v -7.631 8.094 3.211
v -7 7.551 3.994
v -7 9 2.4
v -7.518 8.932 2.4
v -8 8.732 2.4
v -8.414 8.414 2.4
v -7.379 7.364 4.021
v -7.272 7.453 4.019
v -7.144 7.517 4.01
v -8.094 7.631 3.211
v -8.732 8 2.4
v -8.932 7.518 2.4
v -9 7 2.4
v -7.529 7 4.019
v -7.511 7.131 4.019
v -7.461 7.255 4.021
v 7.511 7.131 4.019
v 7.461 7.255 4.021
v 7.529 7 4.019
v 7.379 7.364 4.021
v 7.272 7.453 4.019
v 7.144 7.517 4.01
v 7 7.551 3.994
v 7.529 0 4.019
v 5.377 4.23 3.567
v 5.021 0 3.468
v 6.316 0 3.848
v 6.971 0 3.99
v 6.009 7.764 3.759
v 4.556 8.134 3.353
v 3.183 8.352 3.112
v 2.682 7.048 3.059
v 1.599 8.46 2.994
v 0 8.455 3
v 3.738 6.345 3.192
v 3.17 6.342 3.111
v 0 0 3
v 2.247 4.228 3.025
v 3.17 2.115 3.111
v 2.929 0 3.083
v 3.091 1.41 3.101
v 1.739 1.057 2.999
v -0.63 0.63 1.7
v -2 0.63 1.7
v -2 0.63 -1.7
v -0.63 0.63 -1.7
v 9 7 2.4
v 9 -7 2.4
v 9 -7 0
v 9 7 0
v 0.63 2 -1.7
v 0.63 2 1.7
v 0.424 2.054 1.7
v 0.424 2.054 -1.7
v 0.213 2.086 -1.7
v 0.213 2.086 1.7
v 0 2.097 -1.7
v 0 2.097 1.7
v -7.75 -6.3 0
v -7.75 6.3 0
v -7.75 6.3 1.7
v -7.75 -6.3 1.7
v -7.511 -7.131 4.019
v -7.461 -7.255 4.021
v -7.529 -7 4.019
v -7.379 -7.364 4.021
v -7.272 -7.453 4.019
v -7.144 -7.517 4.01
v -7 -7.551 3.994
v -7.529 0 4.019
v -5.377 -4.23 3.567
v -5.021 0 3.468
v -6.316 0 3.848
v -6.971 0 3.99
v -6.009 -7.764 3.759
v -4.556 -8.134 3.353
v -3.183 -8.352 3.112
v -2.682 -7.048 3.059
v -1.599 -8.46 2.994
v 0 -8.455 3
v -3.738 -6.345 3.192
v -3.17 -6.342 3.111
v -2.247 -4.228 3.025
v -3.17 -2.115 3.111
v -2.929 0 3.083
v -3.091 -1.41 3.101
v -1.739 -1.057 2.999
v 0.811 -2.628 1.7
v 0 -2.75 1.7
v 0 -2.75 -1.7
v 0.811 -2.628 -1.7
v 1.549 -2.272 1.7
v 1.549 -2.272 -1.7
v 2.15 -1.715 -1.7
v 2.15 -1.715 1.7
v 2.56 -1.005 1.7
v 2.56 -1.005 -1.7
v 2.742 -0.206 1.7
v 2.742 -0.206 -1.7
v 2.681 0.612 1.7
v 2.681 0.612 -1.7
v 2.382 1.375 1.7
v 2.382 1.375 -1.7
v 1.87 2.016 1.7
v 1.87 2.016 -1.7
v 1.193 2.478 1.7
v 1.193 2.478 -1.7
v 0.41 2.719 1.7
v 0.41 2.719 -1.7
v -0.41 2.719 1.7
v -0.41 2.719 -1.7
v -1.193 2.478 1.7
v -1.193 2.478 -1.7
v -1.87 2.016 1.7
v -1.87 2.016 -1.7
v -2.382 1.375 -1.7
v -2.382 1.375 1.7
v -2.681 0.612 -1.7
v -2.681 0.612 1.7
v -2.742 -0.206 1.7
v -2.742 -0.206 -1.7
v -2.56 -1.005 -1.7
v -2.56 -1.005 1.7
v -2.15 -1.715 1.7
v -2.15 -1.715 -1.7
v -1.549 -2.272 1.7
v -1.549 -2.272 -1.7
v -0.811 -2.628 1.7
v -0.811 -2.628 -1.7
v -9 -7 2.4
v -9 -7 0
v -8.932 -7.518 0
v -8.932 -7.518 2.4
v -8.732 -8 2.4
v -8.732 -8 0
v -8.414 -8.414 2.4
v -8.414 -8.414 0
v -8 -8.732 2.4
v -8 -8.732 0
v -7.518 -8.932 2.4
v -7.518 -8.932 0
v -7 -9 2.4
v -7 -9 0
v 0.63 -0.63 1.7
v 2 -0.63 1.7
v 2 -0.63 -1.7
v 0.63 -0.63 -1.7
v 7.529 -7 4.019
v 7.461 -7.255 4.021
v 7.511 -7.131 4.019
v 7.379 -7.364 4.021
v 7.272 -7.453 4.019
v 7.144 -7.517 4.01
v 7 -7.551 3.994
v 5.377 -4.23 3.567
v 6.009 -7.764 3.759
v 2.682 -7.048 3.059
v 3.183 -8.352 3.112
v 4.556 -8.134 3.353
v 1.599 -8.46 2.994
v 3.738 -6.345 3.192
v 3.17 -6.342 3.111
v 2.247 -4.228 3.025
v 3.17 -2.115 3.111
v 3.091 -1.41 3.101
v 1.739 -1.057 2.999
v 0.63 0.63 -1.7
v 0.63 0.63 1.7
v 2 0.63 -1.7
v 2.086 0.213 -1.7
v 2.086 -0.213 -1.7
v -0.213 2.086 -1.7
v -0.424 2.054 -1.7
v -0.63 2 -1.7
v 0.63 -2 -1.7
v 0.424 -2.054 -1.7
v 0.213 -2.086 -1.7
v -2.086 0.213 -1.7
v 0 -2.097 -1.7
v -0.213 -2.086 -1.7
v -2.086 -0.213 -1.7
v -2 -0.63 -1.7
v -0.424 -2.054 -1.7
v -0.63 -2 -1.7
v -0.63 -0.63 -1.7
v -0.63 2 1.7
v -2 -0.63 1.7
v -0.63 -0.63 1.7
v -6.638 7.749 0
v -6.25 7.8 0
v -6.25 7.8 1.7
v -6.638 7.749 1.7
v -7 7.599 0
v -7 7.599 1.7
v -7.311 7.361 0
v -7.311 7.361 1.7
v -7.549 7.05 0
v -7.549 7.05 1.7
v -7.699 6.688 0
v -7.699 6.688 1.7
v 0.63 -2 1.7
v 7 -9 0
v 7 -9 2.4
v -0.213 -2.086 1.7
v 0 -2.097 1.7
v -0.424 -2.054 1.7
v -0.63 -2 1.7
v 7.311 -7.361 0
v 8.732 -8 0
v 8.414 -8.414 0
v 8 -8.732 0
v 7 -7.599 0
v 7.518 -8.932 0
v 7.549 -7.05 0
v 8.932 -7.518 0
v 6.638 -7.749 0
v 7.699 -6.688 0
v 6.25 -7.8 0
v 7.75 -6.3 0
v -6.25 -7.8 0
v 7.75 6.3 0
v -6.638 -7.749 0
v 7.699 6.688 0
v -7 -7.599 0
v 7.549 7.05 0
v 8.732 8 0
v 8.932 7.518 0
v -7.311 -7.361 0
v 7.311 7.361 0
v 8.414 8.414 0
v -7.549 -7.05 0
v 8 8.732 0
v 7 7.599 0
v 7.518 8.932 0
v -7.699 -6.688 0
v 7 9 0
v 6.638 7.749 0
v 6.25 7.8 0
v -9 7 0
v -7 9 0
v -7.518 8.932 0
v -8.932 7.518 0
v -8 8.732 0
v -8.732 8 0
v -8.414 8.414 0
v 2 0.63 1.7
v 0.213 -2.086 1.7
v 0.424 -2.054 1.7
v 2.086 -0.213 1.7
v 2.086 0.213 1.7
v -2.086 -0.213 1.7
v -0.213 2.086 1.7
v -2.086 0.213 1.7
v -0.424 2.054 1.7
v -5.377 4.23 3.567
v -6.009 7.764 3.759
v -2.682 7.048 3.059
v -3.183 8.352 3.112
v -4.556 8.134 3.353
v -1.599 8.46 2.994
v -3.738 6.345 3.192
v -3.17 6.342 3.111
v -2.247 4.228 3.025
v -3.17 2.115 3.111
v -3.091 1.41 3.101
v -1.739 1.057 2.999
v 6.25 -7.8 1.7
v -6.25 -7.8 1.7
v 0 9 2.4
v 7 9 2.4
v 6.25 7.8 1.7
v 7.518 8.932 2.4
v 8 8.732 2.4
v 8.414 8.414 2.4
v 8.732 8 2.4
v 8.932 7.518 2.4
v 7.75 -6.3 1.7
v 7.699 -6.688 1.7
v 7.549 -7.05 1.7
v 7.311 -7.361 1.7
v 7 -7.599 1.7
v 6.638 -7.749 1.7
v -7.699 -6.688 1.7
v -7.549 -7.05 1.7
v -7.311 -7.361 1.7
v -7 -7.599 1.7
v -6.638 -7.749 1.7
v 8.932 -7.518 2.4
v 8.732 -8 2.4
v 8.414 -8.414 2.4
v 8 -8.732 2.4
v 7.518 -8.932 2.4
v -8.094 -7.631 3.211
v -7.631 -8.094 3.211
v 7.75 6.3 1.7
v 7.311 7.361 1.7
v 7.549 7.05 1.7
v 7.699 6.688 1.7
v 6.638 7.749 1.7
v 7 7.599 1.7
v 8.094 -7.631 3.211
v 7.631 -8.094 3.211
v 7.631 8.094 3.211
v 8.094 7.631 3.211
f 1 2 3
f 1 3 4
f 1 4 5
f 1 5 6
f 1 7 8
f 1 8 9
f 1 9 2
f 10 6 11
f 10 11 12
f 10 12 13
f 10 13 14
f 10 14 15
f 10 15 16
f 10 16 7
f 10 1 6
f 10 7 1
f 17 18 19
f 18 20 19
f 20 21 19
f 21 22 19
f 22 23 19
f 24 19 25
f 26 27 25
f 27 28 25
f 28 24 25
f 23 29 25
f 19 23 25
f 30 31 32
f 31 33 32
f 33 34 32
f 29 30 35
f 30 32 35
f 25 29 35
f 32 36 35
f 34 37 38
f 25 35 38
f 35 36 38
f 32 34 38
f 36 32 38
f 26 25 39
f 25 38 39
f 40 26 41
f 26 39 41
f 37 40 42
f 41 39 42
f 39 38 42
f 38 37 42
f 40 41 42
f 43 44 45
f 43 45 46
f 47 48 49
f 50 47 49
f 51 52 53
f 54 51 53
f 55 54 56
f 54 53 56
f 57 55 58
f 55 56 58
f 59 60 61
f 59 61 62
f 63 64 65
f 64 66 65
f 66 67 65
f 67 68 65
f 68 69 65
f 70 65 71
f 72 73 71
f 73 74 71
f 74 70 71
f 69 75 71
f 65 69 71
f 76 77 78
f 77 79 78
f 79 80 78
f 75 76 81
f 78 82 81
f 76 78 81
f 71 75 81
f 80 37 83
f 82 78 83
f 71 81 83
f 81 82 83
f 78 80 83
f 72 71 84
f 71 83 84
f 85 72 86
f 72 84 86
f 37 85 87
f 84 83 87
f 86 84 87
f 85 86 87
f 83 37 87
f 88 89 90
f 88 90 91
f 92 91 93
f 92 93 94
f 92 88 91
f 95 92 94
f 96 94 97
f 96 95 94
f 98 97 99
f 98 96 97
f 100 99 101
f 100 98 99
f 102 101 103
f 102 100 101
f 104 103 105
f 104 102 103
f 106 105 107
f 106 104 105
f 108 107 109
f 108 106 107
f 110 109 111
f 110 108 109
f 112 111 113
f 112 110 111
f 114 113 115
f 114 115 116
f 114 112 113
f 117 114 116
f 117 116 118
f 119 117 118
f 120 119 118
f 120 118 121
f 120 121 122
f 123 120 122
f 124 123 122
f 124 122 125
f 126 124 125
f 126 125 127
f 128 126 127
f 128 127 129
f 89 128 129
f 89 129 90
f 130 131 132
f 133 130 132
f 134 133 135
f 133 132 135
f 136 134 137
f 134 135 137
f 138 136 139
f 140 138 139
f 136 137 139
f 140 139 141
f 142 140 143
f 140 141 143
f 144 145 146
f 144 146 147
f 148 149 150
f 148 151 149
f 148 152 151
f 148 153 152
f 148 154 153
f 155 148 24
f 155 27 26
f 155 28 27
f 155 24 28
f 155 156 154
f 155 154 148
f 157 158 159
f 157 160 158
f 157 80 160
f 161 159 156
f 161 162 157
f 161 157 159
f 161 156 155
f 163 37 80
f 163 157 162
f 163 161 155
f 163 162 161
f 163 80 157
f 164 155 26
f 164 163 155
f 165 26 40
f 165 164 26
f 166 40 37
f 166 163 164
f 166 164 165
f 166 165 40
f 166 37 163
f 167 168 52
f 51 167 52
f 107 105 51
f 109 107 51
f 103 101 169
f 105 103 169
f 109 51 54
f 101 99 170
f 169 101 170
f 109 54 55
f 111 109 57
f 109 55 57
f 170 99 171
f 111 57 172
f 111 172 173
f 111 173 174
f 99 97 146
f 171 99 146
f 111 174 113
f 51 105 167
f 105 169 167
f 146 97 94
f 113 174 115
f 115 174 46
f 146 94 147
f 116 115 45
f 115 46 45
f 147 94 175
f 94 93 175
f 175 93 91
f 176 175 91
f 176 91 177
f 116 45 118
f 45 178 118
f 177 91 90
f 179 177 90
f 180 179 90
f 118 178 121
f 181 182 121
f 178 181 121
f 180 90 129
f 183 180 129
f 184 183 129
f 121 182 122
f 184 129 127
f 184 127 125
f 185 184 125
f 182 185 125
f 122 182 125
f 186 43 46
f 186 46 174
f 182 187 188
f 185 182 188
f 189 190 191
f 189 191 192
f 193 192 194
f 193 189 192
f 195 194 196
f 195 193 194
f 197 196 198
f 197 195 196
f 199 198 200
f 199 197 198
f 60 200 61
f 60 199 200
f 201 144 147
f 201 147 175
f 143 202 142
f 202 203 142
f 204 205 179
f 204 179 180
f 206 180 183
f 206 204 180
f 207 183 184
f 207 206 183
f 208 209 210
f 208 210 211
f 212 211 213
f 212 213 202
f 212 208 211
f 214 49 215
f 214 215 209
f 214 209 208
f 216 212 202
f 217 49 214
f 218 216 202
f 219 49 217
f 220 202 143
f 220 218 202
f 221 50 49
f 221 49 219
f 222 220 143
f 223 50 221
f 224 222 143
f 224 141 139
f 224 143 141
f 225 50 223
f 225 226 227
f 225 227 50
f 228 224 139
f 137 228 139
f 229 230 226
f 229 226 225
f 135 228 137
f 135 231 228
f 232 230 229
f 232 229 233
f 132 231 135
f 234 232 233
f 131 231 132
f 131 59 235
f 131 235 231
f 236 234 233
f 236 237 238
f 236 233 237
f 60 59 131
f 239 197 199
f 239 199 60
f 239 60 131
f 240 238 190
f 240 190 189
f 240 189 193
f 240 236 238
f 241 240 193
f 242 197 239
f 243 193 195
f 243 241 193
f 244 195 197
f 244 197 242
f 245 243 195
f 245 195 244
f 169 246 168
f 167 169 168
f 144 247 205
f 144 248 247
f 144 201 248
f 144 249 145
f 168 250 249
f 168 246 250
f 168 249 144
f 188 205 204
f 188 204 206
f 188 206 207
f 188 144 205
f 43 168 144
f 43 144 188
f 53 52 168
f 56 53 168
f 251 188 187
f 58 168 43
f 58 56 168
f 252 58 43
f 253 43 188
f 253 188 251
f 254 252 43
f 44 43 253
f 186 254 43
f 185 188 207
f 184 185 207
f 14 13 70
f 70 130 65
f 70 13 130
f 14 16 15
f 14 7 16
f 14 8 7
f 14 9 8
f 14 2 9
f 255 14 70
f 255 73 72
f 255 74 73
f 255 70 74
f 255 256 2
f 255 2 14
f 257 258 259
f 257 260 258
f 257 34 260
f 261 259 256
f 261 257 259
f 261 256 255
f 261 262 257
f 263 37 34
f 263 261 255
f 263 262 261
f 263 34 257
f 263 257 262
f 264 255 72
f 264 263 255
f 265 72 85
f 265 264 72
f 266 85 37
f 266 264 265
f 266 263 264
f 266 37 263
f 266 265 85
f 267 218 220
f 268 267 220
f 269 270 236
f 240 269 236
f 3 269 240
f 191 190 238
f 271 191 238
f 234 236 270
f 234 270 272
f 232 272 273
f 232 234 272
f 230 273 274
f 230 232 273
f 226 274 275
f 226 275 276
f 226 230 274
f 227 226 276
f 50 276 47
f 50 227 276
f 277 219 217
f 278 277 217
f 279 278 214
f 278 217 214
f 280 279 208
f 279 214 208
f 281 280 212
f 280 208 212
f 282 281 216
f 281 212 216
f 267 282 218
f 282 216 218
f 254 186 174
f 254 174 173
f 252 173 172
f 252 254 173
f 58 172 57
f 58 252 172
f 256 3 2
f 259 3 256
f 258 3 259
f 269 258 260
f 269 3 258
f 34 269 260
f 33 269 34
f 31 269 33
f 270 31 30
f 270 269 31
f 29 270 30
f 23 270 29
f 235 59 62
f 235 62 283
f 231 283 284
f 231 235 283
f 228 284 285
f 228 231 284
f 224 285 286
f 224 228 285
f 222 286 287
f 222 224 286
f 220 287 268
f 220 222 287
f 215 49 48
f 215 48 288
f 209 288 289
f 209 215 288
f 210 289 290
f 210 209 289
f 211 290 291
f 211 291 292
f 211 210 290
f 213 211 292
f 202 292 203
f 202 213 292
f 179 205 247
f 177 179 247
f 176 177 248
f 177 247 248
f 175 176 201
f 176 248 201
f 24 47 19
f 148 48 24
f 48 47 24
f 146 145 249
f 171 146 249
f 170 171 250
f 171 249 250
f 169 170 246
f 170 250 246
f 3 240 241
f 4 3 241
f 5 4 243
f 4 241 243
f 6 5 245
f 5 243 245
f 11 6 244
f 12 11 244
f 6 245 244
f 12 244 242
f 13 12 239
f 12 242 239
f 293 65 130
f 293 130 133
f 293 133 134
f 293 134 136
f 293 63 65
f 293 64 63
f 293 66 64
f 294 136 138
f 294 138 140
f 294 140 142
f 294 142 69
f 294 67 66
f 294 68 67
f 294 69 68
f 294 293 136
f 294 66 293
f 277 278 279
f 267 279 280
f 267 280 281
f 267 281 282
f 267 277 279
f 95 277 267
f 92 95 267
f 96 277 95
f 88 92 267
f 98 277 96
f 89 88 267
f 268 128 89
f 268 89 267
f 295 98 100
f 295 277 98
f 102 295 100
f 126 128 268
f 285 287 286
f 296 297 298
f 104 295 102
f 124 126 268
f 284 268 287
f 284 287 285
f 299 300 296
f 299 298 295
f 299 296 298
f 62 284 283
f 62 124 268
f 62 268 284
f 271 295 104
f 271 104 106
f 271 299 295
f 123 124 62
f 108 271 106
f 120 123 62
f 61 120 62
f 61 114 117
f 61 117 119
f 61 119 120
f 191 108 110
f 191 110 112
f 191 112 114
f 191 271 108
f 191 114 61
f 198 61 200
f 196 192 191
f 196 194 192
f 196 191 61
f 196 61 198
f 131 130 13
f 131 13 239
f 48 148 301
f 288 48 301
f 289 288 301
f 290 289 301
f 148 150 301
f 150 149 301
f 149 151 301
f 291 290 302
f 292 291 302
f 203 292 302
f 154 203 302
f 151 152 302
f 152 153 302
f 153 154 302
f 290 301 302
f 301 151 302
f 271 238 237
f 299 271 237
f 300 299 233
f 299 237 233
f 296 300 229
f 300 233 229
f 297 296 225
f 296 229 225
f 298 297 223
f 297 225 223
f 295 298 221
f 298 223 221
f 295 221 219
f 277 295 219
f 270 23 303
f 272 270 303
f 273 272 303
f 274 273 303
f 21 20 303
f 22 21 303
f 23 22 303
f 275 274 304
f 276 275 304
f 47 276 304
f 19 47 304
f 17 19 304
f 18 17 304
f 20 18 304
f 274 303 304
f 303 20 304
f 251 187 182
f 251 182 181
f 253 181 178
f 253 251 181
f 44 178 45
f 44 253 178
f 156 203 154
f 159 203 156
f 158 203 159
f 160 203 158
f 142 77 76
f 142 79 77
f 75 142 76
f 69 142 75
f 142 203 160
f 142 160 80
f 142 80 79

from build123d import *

# Parameters (mm, degrees)
SKETCH_W        = 9
SKETCH_H        = 18
PAD_DEPTH       = 2.7
PAD001_DEPTH    = 9
POCKET_DEPTH    = 10
POCKET001_DEPTH = 1.7
PAD002_DEPTH    = 3.4


with BuildPart() as part:
    # Sketch → Pad (new body)
    with BuildSketch(Plane.XY):
        with Locations((-4.5, 0)):
            Rectangle(SKETCH_W, SKETCH_H)
    extrude(amount=PAD_DEPTH)

    # Sketch001 → Pad001 (join, symmetric)
    with BuildSketch(Plane.XZ):
        with BuildLine():
            Line((-9, 2.7), (0, 2.7))
            Line((0, 2.7), (0, 3))
            add(Edge.make_bspline(
                [(0, 3), (-2.554918, 2.91153), (-5.658926, 3.478662), (-7.63445, 4.400123), (-9, 3.5)],
                knots=[0, 0, 0, 0, 0.5, 1, 1, 1, 1], degree=3))
            Line((-9, 3.5), (-9, 2.7))
        make_face()
    extrude(amount=PAD001_DEPTH, both=True)

    # Sketch002 → Pocket (cut)
    with BuildSketch(Plane.XY):
        with BuildLine():
            ThreePointArc((-7, 9), (-8.414214, 8.414214), (-9, 7))
            Line((-9, 7), (-10, 7))
            Line((-10, 7), (-10, 10))
            Line((-10, 10), (-7, 10))
            Line((-7, 10), (-7, 9))
        make_face()
        with BuildLine():
            ThreePointArc((-9, -7), (-8.414214, -8.414214), (-7, -9))
            Line((-7, -9), (-7, -10))
            Line((-10, -10), (-7, -10))
            Line((-10, -7), (-10, -10))
            Line((-9, -7), (-10, -7))
        make_face()
    extrude(amount=POCKET_DEPTH, mode=Mode.SUBTRACT)

    # Sketch003 → Pocket001 (cut)
    with BuildSketch(Plane.XY):
        with BuildLine():
            Line((0, 7.8), (-6.25, 7.8))
            ThreePointArc((-6.25, 7.8), (-7.31066, 7.36066), (-7.75, 6.3))
            Line((-7.75, 6.3), (-7.75, -6.3))
            ThreePointArc((-7.75, -6.3), (-7.31066, -7.36066), (-6.25, -7.8))
            Line((-6.25, -7.8), (0, -7.8))
            Line((0, -7.8), (0, 0))
            Line((0, 0), (0, 7.8))
        make_face()
    extrude(amount=POCKET001_DEPTH, mode=Mode.SUBTRACT)

    # Sketch004 (on Face10 of Pocket001) → Pad002 (join)
    with BuildSketch(Plane(origin=(0, 0, 1.7), x_dir=(1, 0, 0), z_dir=(0, 0, -1))):
        with BuildLine():
            ThreePointArc((0, 2.75), (-2.75, 0), (0, -2.75))
            Line((0, -2.096879), (0, -2.75))
            ThreePointArc((-0.63, -2), (-0.318703, -2.072517), (0, -2.096879))
            Line((-0.63, -0.63), (-0.63, -2))
            Line((-2, -0.63), (-0.63, -0.63))
            ThreePointArc((-2, 0.63), (-2.096879, 0), (-2, -0.63))
            Line((-2, 0.63), (-0.63, 0.63))
            Line((-0.63, 0.63), (-0.63, 2))
            ThreePointArc((0, 2.096879), (-0.318703, 2.072517), (-0.63, 2))
            Line((0, 2.75), (0, 2.096879))
        make_face()
    extrude(amount=PAD002_DEPTH)

    # SubtractivePipe: sweep along a path in Sketch009
    with BuildLine(Plane(origin=(0, 0, 2.4), x_dir=(0, -1, 0), z_dir=(0, 0, 1))) as subtractivepipe_path:
        Line((-9, 0), (-9, -7))
        ThreePointArc((-9, -7), (-8.414214, -8.414214), (-7, -9))
        Line((-7, -9), (7, -9))
        ThreePointArc((7, -9), (8.414214, -8.414214), (9, -7))
        Line((9, -7), (9, 0))
    # Sketch008 → SubtractivePipe (sweep, cut)
    with BuildSketch(Plane.YZ):
        Polygon((-9, 2.4), (-7.5, 4.05), (-9, 4.05), align=None)
    sweep(path=subtractivepipe_path.line, mode=Mode.SUBTRACT)

    # Mirrored: part across YZ


with BuildPart() as part_1:
    add(part.part)
    add(part.part.mirror(Plane.YZ))


solid = part_1.part
